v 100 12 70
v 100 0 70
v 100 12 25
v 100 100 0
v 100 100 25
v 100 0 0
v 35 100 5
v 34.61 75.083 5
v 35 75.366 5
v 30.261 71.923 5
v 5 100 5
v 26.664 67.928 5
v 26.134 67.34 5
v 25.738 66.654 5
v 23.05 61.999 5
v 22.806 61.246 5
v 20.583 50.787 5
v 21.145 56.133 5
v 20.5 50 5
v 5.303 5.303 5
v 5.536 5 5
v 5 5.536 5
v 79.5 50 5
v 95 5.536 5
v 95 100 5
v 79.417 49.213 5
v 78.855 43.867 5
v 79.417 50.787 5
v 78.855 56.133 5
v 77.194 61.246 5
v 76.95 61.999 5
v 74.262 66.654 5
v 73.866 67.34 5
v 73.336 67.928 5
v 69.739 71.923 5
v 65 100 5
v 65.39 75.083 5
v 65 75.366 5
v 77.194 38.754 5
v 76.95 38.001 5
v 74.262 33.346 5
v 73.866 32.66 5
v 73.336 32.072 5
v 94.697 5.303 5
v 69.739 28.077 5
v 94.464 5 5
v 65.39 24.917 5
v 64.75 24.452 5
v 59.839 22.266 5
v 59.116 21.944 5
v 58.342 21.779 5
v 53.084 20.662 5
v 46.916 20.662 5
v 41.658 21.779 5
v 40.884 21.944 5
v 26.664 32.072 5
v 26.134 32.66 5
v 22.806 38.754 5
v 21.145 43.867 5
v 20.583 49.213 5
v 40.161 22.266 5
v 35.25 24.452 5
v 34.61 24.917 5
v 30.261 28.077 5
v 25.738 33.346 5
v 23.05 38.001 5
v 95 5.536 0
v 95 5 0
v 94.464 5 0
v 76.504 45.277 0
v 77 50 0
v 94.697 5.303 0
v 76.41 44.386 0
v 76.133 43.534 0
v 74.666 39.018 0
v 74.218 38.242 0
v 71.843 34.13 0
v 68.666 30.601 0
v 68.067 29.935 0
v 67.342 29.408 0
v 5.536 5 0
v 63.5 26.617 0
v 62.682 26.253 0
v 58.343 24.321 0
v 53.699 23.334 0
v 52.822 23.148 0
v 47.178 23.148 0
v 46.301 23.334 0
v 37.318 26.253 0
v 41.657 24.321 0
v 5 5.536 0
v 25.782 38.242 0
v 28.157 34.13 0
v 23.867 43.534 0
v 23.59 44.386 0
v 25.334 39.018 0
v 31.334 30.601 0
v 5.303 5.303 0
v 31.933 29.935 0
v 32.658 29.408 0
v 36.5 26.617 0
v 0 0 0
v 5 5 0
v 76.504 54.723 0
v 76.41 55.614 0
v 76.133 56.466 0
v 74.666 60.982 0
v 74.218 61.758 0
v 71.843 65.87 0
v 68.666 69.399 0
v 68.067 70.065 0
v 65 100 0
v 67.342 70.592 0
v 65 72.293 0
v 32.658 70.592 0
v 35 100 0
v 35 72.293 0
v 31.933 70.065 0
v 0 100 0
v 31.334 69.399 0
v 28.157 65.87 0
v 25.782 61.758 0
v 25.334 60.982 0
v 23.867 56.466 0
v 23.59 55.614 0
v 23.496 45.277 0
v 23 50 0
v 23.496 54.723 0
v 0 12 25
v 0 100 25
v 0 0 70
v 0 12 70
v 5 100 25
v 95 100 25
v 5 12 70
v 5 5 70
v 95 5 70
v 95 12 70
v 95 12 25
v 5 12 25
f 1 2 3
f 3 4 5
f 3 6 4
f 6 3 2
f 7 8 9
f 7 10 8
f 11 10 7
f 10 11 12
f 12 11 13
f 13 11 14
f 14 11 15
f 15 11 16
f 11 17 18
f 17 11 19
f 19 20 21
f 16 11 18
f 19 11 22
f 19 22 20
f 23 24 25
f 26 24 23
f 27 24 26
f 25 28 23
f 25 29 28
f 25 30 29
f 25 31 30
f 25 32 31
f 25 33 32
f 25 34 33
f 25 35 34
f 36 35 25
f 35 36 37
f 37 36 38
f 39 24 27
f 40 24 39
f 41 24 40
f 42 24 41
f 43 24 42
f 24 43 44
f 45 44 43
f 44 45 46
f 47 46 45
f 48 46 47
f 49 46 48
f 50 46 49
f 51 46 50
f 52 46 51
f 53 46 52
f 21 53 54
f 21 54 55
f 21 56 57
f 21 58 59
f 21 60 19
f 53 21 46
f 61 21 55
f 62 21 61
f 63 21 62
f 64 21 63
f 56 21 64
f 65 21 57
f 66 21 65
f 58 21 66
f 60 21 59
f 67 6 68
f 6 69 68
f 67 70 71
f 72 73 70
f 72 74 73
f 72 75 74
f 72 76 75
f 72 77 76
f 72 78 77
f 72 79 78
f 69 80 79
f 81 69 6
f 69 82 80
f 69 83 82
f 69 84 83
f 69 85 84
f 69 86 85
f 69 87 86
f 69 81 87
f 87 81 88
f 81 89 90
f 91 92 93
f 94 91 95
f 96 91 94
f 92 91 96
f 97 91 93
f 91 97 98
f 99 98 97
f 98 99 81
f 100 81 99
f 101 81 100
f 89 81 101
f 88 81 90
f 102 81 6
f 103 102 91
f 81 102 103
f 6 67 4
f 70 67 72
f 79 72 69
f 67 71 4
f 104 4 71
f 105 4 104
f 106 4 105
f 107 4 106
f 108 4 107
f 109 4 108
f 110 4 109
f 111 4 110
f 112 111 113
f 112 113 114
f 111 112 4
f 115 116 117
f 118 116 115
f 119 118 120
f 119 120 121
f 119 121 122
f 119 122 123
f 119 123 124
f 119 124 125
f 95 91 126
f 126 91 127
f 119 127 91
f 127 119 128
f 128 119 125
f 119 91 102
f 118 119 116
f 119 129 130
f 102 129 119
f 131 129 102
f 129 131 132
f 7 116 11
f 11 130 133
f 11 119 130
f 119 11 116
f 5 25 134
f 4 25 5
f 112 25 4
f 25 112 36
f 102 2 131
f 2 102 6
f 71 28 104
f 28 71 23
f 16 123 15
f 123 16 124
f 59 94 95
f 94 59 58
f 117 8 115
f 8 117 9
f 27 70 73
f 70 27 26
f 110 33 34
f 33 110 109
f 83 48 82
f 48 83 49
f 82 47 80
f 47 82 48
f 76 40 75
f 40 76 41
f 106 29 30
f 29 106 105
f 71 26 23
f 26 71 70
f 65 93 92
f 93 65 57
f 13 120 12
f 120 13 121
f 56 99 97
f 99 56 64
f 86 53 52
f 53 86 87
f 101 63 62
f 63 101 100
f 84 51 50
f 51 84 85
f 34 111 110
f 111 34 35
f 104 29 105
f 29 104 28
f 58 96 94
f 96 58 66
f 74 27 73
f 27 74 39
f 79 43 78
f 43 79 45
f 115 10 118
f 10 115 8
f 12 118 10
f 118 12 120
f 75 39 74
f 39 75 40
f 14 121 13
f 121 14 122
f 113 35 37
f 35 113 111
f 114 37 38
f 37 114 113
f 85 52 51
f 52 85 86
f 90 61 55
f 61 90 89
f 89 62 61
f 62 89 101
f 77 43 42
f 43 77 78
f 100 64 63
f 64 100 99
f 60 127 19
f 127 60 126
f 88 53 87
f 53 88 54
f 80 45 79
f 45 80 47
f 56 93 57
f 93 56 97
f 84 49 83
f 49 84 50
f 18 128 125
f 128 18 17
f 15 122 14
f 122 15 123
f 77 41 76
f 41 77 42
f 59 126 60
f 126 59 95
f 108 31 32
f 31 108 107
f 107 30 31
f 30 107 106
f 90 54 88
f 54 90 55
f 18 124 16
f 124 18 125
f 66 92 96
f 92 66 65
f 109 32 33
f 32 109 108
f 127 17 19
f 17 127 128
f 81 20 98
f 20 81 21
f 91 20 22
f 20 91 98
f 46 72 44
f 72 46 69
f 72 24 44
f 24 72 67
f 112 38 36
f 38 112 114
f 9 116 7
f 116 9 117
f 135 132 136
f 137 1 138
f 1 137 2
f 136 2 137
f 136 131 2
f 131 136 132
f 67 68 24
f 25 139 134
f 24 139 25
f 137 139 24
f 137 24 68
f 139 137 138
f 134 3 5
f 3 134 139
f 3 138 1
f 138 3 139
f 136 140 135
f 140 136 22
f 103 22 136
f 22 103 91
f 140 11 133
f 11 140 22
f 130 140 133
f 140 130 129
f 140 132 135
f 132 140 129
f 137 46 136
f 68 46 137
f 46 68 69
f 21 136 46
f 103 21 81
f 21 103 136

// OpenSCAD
/*
Design:
    Wine glass holder

Use:
    Wall mount

Question: what is the best way to mount to the wall?
*/

w = 100;
h = 70;
th = 5;

// Bottom
difference(){
    cube([w,w,th], center=false);
    translate([w/2, w/2, -1]){
        cylinder(th+2, d2=60, d1=53, center=false);
    }
    translate([0, 0, -1]){
        cylinder(th+2, d=15);
    }
    translate([w, 0, -1]){
        cylinder(th+2, d=15);
    }
    translate([(w/2)-15, 70, -2]){
        cube([30, 40, th+3], center=false);
    }
}

// Back
cube([w,th,h], center=false);

// Side one
difference(){
    translate([w-th,0,0]){
        cube([th,w,h]);
    }
    translate([w-6,12,25]){
        cube([th+2,w+1,h], center=false);
    }
}

// Side two
difference(){
    cube([th,w,h], center=false);
    translate([-1,12,25]){
        cube([th+2,w+1,h], center=false);
    }
}
